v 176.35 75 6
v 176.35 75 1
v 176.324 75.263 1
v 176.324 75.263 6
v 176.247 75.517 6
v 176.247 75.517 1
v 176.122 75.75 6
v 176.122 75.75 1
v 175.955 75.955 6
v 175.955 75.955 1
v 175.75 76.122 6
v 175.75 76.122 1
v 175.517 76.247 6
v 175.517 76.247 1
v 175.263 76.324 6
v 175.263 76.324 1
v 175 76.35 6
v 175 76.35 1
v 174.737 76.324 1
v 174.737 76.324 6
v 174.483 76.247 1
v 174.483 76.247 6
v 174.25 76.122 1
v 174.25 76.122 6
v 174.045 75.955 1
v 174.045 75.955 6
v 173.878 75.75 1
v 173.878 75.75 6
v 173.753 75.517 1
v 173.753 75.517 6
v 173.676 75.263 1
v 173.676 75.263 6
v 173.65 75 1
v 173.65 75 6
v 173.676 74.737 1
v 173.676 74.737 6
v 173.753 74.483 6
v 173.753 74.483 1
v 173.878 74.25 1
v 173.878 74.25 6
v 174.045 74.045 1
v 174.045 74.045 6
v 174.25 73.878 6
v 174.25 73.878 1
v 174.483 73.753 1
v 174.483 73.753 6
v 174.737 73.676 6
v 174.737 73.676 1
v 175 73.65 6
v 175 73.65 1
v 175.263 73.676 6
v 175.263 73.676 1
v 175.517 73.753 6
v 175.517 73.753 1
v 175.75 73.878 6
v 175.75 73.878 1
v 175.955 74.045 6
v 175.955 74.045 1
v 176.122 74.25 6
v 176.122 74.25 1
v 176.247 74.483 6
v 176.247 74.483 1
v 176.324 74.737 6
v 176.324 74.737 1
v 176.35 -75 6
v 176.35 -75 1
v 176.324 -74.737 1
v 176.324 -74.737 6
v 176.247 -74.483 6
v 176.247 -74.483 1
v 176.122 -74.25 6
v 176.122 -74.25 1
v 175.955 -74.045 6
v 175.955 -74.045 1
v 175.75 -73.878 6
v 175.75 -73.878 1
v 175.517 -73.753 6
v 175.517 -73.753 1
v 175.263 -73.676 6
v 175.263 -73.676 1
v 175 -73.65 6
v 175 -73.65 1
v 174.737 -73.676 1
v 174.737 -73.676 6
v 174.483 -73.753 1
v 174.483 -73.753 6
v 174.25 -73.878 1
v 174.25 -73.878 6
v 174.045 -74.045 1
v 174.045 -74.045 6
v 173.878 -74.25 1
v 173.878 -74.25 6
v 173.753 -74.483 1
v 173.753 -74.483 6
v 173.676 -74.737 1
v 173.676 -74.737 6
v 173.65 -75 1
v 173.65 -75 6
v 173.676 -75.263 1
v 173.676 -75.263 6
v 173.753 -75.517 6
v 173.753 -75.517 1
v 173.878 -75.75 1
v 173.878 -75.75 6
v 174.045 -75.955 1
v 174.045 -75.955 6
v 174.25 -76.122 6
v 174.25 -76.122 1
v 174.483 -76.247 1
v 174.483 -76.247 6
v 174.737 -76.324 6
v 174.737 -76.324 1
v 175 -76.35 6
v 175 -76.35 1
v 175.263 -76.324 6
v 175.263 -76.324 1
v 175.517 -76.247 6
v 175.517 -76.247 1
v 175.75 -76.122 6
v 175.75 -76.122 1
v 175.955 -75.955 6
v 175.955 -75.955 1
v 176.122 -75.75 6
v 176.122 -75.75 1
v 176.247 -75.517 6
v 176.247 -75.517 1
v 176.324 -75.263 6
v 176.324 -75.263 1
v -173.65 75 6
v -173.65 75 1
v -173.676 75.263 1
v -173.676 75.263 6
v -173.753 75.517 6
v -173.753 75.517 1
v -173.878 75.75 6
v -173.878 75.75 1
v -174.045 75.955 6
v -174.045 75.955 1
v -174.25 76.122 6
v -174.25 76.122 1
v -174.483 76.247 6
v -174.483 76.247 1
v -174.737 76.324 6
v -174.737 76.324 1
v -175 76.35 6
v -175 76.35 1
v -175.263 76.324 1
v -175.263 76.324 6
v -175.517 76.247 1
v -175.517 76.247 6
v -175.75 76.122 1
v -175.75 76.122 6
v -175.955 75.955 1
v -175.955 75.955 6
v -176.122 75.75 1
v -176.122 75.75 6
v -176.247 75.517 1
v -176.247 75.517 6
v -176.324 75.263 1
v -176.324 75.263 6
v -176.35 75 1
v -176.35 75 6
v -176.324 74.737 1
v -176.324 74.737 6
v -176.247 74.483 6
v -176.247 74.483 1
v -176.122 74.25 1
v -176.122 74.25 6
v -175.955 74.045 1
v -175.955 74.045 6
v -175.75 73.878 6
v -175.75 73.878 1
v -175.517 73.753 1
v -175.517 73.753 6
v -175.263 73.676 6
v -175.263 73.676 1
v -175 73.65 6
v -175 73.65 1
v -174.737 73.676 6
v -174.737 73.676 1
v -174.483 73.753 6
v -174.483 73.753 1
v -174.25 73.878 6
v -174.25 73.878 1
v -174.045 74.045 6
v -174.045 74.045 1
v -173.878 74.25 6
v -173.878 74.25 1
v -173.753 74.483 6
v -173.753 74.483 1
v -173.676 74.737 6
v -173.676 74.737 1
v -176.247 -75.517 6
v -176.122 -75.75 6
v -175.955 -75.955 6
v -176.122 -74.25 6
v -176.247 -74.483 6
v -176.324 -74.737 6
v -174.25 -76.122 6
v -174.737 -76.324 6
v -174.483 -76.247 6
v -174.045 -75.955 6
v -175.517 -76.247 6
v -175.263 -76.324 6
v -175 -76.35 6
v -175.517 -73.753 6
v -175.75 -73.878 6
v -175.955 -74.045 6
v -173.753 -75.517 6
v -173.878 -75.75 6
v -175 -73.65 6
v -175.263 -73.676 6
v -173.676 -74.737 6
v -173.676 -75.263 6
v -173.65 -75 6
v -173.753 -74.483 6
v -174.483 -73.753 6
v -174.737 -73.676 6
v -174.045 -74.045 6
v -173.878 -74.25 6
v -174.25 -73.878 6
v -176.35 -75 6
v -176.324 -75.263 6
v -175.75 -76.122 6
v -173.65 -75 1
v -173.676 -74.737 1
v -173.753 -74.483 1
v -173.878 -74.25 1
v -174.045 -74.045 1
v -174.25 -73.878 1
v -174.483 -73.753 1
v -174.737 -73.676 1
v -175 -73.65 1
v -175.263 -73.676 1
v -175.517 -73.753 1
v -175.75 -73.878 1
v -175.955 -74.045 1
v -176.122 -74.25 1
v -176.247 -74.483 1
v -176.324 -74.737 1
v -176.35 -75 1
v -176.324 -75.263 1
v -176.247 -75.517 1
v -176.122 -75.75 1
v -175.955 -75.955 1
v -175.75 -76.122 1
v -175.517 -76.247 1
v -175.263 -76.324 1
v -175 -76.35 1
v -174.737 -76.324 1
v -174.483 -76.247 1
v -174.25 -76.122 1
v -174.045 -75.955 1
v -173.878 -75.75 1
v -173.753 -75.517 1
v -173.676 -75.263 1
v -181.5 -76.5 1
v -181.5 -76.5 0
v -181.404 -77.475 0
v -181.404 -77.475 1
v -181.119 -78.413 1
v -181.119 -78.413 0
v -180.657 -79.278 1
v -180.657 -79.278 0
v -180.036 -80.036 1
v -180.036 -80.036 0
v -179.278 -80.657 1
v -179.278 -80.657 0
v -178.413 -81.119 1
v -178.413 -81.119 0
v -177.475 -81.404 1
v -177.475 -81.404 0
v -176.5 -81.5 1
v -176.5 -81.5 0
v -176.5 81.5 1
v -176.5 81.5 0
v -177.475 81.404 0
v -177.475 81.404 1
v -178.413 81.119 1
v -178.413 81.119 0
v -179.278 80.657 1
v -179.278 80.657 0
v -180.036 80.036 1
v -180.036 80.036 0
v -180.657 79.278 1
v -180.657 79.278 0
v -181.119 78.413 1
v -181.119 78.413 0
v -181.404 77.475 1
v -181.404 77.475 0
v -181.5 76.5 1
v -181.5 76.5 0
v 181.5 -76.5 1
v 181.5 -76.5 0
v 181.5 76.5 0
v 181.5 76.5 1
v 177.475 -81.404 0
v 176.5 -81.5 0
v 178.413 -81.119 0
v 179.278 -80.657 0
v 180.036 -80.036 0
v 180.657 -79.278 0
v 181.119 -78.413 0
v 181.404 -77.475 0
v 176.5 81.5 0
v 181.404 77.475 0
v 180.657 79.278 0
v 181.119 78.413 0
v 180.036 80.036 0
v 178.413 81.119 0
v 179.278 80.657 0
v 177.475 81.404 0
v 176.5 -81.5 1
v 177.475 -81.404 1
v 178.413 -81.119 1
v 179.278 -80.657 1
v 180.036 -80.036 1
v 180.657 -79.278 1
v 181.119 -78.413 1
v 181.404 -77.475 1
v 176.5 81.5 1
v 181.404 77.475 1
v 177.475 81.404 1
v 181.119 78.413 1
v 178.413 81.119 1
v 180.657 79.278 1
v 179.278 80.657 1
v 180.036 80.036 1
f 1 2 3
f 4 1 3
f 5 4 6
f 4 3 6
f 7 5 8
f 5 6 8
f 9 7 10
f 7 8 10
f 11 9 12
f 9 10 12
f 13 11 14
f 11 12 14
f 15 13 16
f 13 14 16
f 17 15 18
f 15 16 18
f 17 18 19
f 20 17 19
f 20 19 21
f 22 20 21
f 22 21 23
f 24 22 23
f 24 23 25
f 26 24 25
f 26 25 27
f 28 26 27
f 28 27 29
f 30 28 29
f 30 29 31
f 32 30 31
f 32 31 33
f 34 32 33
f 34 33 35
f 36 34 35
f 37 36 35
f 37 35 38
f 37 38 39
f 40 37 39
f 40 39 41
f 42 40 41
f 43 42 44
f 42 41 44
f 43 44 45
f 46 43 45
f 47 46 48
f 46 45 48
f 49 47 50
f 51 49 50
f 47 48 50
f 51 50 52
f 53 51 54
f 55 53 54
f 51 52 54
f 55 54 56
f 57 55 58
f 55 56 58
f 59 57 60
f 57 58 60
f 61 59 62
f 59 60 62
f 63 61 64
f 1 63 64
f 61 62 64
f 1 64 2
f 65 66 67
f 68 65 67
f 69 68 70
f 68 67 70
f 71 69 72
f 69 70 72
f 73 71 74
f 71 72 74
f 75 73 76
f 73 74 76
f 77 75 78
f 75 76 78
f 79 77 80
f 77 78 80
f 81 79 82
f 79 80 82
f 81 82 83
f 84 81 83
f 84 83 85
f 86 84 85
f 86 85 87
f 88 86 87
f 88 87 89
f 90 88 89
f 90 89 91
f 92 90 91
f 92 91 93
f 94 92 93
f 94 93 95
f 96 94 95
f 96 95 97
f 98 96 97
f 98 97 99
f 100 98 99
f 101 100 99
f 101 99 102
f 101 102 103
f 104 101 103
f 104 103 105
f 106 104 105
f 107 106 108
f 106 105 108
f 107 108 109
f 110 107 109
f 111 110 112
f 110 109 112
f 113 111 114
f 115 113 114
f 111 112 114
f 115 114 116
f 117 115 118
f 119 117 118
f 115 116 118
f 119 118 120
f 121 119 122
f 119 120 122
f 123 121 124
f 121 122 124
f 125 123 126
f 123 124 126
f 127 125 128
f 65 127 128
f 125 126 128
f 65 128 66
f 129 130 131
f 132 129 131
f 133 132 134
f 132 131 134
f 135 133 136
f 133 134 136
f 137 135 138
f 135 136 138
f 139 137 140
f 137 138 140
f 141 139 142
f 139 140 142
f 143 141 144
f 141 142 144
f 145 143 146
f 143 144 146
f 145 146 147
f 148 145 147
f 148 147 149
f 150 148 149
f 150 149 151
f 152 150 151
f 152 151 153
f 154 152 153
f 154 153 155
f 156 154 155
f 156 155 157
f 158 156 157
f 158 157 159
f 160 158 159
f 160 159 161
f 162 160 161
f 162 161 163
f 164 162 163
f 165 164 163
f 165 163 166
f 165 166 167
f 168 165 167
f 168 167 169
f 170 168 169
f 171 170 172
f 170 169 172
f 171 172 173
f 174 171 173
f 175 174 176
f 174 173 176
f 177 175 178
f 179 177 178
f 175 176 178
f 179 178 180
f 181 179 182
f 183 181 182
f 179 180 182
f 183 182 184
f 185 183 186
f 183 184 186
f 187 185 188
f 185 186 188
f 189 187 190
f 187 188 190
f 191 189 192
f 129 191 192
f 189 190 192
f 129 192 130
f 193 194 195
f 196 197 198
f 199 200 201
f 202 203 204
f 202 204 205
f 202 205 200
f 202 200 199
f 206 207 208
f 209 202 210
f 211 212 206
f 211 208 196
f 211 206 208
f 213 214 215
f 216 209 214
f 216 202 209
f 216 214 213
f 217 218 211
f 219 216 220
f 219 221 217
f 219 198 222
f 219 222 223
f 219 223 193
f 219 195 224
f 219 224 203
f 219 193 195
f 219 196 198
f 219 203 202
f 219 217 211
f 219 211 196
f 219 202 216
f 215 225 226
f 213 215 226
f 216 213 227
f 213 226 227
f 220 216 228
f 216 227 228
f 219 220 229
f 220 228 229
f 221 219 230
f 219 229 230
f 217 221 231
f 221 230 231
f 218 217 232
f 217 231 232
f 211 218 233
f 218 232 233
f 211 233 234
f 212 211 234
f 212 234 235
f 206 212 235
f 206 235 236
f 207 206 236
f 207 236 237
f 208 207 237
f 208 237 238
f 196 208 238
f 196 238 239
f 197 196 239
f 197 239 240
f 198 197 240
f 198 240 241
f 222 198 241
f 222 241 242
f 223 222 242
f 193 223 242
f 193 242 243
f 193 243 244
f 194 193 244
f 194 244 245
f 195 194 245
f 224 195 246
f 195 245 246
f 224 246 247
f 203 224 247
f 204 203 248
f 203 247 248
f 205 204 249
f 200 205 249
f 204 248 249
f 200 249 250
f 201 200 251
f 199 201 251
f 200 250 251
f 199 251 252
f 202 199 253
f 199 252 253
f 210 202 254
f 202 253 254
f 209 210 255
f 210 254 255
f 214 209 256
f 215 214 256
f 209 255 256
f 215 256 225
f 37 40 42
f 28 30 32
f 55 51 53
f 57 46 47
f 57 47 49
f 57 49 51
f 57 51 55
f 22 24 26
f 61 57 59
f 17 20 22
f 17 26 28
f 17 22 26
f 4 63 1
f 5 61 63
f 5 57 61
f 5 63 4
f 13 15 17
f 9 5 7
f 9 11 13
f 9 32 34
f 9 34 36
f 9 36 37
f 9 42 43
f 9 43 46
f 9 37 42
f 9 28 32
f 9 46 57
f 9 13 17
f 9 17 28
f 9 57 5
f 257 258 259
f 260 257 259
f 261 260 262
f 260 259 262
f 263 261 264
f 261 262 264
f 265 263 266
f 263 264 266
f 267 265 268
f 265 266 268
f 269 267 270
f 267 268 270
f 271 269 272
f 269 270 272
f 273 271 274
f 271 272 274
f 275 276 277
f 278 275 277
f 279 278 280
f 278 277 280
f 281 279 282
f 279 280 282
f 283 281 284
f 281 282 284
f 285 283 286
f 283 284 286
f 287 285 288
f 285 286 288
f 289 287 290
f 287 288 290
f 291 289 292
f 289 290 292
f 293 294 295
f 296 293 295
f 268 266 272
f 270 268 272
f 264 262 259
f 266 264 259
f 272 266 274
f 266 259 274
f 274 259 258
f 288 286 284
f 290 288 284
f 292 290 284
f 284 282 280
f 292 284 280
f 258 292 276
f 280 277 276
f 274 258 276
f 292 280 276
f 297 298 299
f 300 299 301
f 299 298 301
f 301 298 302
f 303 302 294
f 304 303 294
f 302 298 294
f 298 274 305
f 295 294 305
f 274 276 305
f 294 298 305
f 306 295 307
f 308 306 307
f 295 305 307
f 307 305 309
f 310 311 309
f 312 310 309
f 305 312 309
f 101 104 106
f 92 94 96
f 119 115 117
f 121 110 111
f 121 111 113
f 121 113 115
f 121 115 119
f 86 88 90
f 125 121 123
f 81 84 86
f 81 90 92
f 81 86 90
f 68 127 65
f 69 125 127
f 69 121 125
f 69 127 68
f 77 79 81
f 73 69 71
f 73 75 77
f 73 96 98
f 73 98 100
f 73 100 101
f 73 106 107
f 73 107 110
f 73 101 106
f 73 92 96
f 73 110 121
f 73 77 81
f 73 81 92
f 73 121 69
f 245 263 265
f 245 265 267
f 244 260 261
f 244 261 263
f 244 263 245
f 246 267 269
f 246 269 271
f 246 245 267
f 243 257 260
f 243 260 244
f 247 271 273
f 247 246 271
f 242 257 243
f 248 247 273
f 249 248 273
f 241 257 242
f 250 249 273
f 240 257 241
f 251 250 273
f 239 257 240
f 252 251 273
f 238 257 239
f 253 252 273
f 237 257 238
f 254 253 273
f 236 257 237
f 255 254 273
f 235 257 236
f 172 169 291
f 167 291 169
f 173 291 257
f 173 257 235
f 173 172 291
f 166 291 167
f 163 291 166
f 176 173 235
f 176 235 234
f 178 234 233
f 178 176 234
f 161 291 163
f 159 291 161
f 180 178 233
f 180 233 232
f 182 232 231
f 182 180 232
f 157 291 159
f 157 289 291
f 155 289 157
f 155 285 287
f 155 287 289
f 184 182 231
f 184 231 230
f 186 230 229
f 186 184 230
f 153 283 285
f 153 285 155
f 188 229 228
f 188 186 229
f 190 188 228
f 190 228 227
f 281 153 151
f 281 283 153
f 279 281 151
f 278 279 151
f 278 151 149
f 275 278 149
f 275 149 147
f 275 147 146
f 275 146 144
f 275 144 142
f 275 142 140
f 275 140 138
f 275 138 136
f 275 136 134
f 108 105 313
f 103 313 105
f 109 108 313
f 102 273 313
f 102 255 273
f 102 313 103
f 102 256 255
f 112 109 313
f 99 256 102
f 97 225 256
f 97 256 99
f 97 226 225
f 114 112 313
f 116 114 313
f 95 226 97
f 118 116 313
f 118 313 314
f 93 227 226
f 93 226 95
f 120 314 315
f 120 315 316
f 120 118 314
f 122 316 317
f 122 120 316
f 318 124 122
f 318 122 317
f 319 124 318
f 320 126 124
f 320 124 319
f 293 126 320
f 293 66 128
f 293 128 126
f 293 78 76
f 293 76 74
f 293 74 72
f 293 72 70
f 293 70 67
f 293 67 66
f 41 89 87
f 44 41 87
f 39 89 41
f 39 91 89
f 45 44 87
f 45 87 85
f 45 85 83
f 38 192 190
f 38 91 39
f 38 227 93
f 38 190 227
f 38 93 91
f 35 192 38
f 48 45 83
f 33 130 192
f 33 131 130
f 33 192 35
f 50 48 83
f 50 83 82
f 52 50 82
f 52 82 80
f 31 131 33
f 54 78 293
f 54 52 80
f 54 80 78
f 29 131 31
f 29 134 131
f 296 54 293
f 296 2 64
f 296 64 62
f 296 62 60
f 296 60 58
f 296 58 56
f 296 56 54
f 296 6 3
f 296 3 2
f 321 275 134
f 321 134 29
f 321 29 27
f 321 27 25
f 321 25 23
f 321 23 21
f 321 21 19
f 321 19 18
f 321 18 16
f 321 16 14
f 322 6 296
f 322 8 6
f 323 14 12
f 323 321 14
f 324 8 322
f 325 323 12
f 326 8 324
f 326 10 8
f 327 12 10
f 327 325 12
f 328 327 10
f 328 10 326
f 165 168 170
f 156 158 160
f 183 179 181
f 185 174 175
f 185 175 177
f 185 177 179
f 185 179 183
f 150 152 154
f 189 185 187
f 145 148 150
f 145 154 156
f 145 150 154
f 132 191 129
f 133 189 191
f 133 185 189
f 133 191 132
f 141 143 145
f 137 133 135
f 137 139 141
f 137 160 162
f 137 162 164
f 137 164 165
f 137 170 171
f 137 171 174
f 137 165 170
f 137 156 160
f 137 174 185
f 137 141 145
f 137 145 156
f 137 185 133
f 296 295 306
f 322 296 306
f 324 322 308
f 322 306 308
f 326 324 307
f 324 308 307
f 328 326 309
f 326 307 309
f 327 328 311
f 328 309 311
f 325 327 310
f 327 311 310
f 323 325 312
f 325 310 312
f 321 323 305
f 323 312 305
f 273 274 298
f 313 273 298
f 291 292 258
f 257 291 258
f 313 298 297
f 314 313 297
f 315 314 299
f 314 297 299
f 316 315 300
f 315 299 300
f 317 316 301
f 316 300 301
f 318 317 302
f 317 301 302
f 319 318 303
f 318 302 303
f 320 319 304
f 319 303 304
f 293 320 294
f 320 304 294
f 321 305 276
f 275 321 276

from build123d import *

# Parameters (mm, degrees)
PAD_DEPTH    = 1
SKETCH001_R  = 1.35
PAD001_DEPTH = 6
SKETCH003_R  = 1.35
PAD002_DEPTH = 6
SKETCH002_R  = 1.35
PAD003_DEPTH = 6
SKETCH004_R  = 1.35
PAD004_DEPTH = 6


with BuildPart() as part:
    # Sketch → Pad (new body)
    with BuildSketch(Plane.XY):
        with BuildLine():
            Line((-181.5, 76.5), (-181.5, -76.5))
            ThreePointArc((-181.5, -76.5), (-180.035534, -80.035534), (-176.5, -81.5))
            Line((-176.5, -81.5), (176.5, -81.5))
            ThreePointArc((176.5, -81.5), (180.035534, -80.035534), (181.5, -76.5))
            Line((181.5, -76.5), (181.5, 76.5))
            ThreePointArc((181.5, 76.5), (180.035534, 80.035534), (176.5, 81.5))
            Line((176.5, 81.5), (-176.5, 81.5))
            ThreePointArc((-176.5, 81.5), (-180.035534, 80.035534), (-181.5, 76.5))
        make_face()
    extrude(amount=PAD_DEPTH)

    # Sketch001 → Pad001 (join)
    with BuildSketch(Plane.XY):
        with Locations((-175, 75)):
            Circle(SKETCH001_R)
    extrude(amount=PAD001_DEPTH)

    # Sketch003 → Pad002 (join)
    with BuildSketch(Plane.XY):
        with Locations((175, 75)):
            Circle(SKETCH003_R)
    extrude(amount=PAD002_DEPTH)

    # Sketch002 → Pad003 (join)
    with BuildSketch(Plane.XY):
        with Locations((-175, -75)):
            Circle(SKETCH002_R)
    extrude(amount=PAD003_DEPTH)

    # Sketch004 → Pad004 (join)
    with BuildSketch(Plane.XY):
        with Locations((175, -75)):
            Circle(SKETCH004_R)
    extrude(amount=PAD004_DEPTH)


solid = part.part
